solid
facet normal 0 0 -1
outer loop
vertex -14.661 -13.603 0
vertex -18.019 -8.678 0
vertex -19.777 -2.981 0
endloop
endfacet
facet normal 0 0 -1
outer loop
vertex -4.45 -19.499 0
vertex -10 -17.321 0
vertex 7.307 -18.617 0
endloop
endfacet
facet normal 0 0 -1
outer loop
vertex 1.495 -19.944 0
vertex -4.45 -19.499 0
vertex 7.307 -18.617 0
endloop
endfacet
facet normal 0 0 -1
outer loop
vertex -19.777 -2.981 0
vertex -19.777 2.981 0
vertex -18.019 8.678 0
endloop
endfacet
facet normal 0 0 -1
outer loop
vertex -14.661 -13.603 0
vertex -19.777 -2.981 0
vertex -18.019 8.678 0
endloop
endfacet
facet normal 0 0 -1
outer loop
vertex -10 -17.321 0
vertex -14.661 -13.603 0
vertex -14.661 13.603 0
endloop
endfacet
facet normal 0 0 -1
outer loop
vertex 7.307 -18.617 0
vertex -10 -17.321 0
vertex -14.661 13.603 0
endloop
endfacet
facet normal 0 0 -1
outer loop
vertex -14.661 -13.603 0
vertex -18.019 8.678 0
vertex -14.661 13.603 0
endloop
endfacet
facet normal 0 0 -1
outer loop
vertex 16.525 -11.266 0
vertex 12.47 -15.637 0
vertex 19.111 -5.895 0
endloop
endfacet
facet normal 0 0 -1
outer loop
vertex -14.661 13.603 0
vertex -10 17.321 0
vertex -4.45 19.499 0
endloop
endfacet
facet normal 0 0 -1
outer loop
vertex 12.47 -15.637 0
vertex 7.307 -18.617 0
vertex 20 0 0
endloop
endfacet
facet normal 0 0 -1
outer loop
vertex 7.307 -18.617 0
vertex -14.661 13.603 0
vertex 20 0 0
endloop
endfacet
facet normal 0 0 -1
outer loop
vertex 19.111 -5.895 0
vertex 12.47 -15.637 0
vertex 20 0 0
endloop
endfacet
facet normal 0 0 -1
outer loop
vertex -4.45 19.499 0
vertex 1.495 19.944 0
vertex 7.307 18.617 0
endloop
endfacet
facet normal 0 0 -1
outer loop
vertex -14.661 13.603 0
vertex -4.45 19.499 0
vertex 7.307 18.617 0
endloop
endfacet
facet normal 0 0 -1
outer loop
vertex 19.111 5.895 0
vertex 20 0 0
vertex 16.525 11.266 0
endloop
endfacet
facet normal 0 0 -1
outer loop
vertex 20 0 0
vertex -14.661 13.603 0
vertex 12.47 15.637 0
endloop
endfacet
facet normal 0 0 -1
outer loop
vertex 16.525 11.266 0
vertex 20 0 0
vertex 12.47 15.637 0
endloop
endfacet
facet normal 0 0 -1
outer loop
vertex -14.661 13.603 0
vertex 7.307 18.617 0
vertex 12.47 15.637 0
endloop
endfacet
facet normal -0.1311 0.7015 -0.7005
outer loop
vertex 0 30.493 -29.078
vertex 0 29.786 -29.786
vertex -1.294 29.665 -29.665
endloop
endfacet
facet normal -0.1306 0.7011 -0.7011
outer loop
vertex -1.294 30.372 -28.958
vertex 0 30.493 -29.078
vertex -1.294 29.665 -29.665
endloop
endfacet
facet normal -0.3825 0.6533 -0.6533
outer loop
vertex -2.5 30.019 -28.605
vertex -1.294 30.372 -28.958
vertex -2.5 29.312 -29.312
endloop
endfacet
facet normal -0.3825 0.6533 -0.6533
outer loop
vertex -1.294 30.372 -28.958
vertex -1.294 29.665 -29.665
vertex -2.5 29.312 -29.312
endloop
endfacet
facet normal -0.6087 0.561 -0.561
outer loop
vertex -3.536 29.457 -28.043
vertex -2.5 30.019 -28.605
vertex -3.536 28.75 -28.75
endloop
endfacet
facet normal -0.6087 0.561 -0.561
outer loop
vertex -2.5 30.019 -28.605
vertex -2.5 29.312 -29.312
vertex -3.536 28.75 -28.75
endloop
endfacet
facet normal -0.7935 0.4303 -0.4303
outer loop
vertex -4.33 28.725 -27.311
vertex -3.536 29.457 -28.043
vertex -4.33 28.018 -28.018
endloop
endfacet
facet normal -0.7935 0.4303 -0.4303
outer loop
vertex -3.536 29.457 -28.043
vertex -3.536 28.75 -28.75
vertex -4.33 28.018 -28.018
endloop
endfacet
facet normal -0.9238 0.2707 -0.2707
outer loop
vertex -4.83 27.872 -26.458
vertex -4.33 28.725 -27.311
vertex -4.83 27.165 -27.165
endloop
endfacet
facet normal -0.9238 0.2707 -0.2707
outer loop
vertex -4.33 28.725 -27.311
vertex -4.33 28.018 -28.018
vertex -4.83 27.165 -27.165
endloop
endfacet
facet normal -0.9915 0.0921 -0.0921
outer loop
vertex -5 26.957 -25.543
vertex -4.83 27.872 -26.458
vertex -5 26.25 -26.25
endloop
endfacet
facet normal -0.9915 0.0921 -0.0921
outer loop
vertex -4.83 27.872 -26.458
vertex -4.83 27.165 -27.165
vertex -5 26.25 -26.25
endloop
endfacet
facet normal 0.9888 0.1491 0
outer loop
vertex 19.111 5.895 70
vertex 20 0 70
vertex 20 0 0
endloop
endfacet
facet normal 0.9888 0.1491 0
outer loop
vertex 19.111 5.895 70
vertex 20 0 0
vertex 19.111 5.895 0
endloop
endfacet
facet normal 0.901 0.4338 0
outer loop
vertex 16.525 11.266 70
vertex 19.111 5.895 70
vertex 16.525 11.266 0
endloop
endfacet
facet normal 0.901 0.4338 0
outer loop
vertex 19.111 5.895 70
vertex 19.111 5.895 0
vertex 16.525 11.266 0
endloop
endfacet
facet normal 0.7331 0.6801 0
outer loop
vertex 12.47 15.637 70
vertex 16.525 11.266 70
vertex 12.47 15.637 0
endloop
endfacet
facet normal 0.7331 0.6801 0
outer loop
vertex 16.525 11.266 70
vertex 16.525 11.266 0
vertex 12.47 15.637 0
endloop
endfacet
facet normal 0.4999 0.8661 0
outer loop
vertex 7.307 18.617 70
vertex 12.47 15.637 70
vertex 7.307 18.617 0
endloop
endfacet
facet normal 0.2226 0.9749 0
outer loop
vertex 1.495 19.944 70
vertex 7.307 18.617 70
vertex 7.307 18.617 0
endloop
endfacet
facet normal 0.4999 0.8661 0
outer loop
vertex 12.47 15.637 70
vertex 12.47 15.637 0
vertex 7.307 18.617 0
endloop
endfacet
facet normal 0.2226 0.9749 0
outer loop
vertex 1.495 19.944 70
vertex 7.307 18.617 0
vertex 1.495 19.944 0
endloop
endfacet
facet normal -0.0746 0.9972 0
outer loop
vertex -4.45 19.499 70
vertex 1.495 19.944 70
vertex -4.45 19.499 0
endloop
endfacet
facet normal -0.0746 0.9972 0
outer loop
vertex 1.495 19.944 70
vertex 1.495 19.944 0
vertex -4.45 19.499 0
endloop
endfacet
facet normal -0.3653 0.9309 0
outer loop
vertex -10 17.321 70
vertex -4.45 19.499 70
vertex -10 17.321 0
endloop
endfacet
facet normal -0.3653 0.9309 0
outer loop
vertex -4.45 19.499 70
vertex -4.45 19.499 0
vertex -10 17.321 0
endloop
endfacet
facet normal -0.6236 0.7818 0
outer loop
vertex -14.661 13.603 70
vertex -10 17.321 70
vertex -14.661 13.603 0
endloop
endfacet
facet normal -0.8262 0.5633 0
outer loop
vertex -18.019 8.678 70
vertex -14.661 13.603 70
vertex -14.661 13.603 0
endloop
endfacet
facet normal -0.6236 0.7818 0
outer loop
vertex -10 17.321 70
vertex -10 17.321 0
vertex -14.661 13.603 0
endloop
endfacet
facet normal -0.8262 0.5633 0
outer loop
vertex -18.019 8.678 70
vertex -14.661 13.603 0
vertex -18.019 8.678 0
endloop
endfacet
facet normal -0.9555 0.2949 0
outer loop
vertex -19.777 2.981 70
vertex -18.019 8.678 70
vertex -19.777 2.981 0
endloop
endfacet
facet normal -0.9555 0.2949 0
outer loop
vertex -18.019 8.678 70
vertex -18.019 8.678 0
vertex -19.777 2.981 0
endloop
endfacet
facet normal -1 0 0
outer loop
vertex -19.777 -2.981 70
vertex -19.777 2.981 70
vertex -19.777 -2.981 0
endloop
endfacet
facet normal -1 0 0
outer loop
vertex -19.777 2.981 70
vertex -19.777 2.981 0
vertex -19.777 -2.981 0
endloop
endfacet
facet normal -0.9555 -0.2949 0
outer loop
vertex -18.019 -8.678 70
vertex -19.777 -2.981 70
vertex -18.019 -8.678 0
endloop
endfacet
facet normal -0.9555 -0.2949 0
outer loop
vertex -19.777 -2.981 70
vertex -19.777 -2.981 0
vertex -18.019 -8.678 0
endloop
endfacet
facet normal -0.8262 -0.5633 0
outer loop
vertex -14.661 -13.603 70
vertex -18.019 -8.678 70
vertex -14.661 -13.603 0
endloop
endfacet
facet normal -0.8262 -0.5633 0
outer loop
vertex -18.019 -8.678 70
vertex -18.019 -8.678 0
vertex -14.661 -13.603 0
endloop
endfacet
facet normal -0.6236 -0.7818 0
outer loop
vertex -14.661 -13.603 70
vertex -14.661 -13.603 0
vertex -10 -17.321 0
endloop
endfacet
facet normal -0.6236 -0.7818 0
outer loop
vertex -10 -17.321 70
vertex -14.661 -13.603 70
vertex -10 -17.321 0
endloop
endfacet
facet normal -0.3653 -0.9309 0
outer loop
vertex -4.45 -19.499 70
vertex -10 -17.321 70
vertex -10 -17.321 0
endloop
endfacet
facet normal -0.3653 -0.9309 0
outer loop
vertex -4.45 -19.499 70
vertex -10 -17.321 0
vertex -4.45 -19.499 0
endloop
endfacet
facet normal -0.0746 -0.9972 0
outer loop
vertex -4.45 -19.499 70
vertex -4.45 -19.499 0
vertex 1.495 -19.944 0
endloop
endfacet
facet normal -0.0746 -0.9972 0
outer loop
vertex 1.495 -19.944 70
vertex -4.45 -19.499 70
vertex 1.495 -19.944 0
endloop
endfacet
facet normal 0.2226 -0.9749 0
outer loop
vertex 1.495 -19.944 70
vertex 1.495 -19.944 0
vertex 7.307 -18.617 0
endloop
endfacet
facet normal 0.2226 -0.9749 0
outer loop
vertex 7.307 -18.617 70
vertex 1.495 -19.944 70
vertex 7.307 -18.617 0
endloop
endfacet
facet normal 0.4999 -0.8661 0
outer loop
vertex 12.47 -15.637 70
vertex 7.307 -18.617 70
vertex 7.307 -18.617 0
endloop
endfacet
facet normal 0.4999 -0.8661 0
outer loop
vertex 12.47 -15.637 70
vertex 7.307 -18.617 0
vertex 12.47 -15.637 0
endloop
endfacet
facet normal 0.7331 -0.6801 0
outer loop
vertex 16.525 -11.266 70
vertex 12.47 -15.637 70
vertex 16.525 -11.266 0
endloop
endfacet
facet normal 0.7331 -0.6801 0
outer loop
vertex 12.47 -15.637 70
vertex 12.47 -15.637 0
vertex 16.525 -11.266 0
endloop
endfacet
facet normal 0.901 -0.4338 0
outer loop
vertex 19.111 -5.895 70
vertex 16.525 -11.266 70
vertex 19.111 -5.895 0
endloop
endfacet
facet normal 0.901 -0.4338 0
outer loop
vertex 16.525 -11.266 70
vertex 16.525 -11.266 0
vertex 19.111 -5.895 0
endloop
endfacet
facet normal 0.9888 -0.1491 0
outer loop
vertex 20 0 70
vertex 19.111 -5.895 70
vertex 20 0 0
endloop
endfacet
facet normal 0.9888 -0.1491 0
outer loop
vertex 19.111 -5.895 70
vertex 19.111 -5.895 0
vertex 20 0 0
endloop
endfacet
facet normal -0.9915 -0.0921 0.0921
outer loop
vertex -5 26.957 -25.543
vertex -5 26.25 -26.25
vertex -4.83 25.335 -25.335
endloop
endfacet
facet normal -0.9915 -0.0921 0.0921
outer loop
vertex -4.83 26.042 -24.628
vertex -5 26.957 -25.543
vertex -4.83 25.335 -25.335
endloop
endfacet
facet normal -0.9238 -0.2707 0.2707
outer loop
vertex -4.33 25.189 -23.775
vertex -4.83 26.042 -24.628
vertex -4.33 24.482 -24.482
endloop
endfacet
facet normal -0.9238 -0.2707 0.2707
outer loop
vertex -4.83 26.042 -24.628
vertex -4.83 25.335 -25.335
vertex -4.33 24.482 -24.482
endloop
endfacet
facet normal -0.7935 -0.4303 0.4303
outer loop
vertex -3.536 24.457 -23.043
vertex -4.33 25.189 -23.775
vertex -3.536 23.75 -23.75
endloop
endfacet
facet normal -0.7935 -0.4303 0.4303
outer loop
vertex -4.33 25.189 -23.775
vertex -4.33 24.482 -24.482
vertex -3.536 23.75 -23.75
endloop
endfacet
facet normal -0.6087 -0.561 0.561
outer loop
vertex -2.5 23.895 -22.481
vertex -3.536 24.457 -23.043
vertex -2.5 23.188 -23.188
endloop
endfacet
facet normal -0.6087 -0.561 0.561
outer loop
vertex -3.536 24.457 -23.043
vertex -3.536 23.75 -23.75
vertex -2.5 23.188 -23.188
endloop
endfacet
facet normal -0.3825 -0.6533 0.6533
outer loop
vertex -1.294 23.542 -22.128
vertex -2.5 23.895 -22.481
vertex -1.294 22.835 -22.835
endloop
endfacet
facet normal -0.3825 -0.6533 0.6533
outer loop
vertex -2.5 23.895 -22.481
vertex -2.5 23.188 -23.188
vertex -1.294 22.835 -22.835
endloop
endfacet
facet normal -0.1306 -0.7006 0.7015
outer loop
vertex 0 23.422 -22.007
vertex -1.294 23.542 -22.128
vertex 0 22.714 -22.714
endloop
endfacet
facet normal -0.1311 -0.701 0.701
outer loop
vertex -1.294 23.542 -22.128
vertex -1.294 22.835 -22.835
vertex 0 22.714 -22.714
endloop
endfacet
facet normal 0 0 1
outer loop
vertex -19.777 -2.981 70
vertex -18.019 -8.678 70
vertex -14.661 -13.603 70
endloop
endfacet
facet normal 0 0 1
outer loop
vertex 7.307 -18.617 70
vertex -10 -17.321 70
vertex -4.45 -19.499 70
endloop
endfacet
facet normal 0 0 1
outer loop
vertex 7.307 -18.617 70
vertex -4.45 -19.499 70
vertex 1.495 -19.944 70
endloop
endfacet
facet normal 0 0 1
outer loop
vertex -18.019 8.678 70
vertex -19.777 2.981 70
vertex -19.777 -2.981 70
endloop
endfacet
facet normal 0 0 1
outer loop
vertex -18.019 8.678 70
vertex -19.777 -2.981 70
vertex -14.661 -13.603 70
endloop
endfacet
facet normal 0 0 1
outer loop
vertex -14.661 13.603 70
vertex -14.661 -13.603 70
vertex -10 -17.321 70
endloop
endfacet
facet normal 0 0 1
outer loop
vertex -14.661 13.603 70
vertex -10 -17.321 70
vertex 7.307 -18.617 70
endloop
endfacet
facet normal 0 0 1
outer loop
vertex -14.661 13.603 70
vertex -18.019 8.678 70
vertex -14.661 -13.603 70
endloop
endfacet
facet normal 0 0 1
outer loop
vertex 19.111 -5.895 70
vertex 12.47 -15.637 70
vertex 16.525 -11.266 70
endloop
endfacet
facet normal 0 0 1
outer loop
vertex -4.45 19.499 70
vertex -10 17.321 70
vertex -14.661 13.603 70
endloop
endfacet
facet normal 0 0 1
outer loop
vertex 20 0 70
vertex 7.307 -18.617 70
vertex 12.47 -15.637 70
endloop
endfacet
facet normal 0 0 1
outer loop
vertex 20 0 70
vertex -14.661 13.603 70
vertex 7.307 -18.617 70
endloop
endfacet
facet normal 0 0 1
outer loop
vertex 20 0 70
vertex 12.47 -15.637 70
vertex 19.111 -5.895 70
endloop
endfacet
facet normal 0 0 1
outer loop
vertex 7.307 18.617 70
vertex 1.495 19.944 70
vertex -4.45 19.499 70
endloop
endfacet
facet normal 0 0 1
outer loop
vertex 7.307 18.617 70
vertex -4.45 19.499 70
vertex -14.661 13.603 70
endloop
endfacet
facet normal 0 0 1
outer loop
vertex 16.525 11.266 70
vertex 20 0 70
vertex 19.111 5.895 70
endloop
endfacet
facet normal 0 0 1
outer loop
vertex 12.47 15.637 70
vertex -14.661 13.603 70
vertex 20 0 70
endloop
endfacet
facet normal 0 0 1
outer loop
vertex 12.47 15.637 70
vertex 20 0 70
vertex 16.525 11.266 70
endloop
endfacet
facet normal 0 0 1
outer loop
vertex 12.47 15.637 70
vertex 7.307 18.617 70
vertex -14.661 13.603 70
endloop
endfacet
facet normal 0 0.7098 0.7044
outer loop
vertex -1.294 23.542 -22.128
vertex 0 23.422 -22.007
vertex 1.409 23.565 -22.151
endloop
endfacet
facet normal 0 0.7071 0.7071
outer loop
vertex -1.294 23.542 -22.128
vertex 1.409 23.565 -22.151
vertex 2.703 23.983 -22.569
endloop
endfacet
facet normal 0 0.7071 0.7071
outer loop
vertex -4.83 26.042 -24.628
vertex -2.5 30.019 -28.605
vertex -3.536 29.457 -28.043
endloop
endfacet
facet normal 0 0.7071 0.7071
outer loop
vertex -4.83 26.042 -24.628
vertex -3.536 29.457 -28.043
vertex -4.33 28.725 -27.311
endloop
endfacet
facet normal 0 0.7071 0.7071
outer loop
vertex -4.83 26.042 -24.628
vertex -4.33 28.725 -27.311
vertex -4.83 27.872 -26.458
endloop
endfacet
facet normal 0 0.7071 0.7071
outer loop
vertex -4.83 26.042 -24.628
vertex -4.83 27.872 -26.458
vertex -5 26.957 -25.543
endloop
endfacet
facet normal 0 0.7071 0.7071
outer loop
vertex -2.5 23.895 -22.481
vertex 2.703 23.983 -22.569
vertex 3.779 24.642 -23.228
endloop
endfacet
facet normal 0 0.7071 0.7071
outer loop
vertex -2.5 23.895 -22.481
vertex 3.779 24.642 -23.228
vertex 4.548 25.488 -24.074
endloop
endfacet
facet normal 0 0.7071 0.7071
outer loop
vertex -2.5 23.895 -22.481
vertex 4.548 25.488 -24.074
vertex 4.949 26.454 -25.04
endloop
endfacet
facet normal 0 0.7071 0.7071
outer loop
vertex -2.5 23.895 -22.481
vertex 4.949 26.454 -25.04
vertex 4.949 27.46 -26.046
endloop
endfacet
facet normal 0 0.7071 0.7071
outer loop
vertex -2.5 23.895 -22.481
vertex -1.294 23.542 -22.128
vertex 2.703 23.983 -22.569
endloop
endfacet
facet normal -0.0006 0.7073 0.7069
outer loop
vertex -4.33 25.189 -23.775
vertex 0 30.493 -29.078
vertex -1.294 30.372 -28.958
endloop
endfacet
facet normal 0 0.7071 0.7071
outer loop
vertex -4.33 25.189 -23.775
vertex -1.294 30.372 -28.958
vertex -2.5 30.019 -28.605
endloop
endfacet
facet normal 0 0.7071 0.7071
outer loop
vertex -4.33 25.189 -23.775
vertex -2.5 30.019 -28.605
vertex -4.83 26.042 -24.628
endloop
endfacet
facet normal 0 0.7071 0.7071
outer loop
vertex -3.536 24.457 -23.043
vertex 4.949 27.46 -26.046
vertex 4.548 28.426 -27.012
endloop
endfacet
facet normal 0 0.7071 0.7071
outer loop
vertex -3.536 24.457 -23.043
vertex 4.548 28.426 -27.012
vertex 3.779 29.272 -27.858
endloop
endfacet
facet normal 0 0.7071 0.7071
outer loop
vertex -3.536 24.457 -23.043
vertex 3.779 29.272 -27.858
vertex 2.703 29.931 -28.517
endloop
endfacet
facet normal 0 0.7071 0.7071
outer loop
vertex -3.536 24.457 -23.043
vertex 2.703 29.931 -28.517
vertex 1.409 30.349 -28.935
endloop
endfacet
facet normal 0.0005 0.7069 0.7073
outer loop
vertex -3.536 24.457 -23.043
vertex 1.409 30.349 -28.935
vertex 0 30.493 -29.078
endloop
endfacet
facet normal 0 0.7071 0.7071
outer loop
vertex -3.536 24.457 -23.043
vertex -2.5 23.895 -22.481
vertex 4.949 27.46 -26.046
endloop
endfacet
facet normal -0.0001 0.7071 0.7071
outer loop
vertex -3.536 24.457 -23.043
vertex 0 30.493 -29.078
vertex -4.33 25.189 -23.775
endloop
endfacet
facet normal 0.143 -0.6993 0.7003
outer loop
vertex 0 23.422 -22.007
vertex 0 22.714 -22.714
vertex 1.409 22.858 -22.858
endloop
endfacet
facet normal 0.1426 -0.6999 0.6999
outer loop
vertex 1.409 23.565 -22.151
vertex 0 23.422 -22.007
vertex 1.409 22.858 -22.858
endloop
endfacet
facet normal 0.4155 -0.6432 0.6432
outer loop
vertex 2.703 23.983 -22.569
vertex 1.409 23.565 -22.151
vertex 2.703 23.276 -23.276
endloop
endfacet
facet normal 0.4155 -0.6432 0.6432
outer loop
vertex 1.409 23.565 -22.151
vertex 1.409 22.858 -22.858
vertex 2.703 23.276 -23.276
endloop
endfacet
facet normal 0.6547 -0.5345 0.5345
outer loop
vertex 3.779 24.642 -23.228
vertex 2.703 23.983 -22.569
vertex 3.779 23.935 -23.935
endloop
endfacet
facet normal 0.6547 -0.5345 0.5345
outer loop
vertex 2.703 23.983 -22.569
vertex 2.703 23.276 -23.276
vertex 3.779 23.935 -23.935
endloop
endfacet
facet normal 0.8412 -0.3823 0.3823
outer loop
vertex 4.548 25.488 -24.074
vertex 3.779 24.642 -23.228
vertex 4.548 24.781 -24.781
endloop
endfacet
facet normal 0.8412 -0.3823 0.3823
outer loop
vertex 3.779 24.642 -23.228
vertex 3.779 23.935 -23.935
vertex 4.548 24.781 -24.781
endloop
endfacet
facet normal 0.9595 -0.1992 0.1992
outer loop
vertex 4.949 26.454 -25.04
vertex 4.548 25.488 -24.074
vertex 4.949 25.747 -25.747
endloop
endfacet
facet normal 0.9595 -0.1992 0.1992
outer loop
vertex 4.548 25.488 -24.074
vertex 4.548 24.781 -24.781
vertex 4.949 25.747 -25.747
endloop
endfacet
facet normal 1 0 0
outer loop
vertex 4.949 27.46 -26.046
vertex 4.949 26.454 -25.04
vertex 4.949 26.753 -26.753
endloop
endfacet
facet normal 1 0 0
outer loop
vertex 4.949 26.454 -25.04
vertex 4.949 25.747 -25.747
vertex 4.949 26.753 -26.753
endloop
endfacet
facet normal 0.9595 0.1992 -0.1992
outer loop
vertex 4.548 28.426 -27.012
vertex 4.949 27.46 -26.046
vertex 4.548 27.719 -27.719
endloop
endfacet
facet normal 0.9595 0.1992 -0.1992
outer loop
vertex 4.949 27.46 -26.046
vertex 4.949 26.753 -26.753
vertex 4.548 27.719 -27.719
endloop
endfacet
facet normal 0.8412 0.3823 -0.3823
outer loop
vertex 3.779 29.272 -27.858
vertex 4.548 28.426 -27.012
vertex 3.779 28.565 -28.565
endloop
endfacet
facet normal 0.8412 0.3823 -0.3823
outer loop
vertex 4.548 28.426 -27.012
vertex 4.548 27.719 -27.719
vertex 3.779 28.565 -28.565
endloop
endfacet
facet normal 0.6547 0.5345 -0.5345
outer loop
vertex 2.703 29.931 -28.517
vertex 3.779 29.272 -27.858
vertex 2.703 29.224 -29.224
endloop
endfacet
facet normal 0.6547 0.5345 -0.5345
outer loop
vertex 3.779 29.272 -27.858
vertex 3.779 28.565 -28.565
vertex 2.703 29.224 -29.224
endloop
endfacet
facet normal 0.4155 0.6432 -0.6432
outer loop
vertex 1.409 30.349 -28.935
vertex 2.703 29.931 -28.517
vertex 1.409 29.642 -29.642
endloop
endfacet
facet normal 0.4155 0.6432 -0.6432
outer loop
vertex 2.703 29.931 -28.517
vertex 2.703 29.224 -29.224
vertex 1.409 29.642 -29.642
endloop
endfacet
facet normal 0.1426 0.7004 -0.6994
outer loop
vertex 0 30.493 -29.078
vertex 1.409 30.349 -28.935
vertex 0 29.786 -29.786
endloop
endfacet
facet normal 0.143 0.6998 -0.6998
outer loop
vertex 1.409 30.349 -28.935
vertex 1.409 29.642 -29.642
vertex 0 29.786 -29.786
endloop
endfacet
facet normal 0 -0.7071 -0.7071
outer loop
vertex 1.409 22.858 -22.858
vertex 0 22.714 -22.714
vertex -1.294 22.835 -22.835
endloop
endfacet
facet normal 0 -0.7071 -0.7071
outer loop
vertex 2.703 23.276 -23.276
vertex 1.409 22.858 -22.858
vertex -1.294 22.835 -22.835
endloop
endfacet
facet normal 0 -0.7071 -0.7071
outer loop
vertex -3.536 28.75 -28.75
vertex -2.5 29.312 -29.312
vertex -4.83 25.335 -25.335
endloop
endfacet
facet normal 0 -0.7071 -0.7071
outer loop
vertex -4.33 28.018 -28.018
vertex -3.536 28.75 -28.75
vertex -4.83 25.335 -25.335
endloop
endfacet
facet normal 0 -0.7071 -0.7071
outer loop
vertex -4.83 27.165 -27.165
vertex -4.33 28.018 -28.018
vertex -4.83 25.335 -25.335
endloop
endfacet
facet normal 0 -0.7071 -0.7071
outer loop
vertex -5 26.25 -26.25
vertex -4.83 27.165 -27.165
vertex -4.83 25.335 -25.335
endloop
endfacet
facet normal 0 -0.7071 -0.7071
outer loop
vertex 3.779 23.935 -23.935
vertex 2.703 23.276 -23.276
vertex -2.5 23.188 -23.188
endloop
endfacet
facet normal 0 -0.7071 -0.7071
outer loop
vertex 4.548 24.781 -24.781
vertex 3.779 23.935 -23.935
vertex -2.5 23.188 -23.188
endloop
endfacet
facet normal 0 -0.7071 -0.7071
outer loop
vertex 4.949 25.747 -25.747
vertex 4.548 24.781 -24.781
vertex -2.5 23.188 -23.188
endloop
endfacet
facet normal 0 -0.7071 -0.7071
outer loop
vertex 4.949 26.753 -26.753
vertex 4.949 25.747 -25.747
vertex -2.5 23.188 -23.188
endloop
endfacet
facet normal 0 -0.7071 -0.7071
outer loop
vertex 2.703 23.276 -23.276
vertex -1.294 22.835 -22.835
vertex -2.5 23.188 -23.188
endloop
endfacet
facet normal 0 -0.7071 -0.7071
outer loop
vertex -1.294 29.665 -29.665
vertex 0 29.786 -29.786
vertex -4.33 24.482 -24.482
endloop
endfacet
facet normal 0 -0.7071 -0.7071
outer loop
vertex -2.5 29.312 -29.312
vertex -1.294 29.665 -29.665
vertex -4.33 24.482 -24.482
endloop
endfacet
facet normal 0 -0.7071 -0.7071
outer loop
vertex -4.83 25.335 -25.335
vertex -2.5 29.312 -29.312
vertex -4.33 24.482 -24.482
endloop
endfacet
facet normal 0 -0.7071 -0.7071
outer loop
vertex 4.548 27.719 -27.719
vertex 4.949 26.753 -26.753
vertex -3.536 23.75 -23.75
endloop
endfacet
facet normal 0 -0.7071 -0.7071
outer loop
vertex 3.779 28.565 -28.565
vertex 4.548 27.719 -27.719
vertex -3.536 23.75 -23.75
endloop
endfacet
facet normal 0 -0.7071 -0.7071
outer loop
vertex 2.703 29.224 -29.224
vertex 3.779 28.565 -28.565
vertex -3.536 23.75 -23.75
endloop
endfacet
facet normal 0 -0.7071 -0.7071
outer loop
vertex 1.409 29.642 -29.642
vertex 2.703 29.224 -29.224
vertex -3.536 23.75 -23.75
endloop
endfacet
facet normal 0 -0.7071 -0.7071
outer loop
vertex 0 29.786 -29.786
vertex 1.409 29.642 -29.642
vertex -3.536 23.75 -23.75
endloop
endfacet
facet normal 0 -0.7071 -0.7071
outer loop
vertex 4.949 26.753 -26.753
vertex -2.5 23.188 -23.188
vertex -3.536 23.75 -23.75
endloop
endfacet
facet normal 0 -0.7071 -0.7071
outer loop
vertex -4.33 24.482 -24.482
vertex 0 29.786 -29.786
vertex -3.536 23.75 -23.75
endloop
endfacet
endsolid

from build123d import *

# Parameters (mm, degrees)
F0_R     = 20
F1_DEPTH = 70
F5_DEPTH = 1


with BuildPart() as f1:
    # F0 (on Top) → F1 (new body)
    with BuildSketch(Plane.XY):
        Circle(F0_R)
    extrude(amount=F1_DEPTH)


with BuildPart() as f5:
    # F4 (on face) → F5 (new body)
    with BuildSketch(Plane(origin=(0, 0, 0), x_dir=(-1, 0, 0), z_dir=(0, 0.707107, 0.707107))):
        with BuildLine():
            ThreePointArc((0, -42.123106), (3.535534, -40.65864), (5, -37.123106))
            ThreePointArc((5, -37.123106), (3.535534, -33.587573), (0, -32.123106))
            Line((0, -32.123106), (0, -42.123106))
        make_face()
        with BuildLine():
            Line((0, -42.123106), (0, -32.123106))
            ThreePointArc((0, -32.123106), (-5, -37.123106), (0, -42.123106))
        make_face()
    extrude(amount=F5_DEPTH)


solid = Compound([f1.part, f5.part])
